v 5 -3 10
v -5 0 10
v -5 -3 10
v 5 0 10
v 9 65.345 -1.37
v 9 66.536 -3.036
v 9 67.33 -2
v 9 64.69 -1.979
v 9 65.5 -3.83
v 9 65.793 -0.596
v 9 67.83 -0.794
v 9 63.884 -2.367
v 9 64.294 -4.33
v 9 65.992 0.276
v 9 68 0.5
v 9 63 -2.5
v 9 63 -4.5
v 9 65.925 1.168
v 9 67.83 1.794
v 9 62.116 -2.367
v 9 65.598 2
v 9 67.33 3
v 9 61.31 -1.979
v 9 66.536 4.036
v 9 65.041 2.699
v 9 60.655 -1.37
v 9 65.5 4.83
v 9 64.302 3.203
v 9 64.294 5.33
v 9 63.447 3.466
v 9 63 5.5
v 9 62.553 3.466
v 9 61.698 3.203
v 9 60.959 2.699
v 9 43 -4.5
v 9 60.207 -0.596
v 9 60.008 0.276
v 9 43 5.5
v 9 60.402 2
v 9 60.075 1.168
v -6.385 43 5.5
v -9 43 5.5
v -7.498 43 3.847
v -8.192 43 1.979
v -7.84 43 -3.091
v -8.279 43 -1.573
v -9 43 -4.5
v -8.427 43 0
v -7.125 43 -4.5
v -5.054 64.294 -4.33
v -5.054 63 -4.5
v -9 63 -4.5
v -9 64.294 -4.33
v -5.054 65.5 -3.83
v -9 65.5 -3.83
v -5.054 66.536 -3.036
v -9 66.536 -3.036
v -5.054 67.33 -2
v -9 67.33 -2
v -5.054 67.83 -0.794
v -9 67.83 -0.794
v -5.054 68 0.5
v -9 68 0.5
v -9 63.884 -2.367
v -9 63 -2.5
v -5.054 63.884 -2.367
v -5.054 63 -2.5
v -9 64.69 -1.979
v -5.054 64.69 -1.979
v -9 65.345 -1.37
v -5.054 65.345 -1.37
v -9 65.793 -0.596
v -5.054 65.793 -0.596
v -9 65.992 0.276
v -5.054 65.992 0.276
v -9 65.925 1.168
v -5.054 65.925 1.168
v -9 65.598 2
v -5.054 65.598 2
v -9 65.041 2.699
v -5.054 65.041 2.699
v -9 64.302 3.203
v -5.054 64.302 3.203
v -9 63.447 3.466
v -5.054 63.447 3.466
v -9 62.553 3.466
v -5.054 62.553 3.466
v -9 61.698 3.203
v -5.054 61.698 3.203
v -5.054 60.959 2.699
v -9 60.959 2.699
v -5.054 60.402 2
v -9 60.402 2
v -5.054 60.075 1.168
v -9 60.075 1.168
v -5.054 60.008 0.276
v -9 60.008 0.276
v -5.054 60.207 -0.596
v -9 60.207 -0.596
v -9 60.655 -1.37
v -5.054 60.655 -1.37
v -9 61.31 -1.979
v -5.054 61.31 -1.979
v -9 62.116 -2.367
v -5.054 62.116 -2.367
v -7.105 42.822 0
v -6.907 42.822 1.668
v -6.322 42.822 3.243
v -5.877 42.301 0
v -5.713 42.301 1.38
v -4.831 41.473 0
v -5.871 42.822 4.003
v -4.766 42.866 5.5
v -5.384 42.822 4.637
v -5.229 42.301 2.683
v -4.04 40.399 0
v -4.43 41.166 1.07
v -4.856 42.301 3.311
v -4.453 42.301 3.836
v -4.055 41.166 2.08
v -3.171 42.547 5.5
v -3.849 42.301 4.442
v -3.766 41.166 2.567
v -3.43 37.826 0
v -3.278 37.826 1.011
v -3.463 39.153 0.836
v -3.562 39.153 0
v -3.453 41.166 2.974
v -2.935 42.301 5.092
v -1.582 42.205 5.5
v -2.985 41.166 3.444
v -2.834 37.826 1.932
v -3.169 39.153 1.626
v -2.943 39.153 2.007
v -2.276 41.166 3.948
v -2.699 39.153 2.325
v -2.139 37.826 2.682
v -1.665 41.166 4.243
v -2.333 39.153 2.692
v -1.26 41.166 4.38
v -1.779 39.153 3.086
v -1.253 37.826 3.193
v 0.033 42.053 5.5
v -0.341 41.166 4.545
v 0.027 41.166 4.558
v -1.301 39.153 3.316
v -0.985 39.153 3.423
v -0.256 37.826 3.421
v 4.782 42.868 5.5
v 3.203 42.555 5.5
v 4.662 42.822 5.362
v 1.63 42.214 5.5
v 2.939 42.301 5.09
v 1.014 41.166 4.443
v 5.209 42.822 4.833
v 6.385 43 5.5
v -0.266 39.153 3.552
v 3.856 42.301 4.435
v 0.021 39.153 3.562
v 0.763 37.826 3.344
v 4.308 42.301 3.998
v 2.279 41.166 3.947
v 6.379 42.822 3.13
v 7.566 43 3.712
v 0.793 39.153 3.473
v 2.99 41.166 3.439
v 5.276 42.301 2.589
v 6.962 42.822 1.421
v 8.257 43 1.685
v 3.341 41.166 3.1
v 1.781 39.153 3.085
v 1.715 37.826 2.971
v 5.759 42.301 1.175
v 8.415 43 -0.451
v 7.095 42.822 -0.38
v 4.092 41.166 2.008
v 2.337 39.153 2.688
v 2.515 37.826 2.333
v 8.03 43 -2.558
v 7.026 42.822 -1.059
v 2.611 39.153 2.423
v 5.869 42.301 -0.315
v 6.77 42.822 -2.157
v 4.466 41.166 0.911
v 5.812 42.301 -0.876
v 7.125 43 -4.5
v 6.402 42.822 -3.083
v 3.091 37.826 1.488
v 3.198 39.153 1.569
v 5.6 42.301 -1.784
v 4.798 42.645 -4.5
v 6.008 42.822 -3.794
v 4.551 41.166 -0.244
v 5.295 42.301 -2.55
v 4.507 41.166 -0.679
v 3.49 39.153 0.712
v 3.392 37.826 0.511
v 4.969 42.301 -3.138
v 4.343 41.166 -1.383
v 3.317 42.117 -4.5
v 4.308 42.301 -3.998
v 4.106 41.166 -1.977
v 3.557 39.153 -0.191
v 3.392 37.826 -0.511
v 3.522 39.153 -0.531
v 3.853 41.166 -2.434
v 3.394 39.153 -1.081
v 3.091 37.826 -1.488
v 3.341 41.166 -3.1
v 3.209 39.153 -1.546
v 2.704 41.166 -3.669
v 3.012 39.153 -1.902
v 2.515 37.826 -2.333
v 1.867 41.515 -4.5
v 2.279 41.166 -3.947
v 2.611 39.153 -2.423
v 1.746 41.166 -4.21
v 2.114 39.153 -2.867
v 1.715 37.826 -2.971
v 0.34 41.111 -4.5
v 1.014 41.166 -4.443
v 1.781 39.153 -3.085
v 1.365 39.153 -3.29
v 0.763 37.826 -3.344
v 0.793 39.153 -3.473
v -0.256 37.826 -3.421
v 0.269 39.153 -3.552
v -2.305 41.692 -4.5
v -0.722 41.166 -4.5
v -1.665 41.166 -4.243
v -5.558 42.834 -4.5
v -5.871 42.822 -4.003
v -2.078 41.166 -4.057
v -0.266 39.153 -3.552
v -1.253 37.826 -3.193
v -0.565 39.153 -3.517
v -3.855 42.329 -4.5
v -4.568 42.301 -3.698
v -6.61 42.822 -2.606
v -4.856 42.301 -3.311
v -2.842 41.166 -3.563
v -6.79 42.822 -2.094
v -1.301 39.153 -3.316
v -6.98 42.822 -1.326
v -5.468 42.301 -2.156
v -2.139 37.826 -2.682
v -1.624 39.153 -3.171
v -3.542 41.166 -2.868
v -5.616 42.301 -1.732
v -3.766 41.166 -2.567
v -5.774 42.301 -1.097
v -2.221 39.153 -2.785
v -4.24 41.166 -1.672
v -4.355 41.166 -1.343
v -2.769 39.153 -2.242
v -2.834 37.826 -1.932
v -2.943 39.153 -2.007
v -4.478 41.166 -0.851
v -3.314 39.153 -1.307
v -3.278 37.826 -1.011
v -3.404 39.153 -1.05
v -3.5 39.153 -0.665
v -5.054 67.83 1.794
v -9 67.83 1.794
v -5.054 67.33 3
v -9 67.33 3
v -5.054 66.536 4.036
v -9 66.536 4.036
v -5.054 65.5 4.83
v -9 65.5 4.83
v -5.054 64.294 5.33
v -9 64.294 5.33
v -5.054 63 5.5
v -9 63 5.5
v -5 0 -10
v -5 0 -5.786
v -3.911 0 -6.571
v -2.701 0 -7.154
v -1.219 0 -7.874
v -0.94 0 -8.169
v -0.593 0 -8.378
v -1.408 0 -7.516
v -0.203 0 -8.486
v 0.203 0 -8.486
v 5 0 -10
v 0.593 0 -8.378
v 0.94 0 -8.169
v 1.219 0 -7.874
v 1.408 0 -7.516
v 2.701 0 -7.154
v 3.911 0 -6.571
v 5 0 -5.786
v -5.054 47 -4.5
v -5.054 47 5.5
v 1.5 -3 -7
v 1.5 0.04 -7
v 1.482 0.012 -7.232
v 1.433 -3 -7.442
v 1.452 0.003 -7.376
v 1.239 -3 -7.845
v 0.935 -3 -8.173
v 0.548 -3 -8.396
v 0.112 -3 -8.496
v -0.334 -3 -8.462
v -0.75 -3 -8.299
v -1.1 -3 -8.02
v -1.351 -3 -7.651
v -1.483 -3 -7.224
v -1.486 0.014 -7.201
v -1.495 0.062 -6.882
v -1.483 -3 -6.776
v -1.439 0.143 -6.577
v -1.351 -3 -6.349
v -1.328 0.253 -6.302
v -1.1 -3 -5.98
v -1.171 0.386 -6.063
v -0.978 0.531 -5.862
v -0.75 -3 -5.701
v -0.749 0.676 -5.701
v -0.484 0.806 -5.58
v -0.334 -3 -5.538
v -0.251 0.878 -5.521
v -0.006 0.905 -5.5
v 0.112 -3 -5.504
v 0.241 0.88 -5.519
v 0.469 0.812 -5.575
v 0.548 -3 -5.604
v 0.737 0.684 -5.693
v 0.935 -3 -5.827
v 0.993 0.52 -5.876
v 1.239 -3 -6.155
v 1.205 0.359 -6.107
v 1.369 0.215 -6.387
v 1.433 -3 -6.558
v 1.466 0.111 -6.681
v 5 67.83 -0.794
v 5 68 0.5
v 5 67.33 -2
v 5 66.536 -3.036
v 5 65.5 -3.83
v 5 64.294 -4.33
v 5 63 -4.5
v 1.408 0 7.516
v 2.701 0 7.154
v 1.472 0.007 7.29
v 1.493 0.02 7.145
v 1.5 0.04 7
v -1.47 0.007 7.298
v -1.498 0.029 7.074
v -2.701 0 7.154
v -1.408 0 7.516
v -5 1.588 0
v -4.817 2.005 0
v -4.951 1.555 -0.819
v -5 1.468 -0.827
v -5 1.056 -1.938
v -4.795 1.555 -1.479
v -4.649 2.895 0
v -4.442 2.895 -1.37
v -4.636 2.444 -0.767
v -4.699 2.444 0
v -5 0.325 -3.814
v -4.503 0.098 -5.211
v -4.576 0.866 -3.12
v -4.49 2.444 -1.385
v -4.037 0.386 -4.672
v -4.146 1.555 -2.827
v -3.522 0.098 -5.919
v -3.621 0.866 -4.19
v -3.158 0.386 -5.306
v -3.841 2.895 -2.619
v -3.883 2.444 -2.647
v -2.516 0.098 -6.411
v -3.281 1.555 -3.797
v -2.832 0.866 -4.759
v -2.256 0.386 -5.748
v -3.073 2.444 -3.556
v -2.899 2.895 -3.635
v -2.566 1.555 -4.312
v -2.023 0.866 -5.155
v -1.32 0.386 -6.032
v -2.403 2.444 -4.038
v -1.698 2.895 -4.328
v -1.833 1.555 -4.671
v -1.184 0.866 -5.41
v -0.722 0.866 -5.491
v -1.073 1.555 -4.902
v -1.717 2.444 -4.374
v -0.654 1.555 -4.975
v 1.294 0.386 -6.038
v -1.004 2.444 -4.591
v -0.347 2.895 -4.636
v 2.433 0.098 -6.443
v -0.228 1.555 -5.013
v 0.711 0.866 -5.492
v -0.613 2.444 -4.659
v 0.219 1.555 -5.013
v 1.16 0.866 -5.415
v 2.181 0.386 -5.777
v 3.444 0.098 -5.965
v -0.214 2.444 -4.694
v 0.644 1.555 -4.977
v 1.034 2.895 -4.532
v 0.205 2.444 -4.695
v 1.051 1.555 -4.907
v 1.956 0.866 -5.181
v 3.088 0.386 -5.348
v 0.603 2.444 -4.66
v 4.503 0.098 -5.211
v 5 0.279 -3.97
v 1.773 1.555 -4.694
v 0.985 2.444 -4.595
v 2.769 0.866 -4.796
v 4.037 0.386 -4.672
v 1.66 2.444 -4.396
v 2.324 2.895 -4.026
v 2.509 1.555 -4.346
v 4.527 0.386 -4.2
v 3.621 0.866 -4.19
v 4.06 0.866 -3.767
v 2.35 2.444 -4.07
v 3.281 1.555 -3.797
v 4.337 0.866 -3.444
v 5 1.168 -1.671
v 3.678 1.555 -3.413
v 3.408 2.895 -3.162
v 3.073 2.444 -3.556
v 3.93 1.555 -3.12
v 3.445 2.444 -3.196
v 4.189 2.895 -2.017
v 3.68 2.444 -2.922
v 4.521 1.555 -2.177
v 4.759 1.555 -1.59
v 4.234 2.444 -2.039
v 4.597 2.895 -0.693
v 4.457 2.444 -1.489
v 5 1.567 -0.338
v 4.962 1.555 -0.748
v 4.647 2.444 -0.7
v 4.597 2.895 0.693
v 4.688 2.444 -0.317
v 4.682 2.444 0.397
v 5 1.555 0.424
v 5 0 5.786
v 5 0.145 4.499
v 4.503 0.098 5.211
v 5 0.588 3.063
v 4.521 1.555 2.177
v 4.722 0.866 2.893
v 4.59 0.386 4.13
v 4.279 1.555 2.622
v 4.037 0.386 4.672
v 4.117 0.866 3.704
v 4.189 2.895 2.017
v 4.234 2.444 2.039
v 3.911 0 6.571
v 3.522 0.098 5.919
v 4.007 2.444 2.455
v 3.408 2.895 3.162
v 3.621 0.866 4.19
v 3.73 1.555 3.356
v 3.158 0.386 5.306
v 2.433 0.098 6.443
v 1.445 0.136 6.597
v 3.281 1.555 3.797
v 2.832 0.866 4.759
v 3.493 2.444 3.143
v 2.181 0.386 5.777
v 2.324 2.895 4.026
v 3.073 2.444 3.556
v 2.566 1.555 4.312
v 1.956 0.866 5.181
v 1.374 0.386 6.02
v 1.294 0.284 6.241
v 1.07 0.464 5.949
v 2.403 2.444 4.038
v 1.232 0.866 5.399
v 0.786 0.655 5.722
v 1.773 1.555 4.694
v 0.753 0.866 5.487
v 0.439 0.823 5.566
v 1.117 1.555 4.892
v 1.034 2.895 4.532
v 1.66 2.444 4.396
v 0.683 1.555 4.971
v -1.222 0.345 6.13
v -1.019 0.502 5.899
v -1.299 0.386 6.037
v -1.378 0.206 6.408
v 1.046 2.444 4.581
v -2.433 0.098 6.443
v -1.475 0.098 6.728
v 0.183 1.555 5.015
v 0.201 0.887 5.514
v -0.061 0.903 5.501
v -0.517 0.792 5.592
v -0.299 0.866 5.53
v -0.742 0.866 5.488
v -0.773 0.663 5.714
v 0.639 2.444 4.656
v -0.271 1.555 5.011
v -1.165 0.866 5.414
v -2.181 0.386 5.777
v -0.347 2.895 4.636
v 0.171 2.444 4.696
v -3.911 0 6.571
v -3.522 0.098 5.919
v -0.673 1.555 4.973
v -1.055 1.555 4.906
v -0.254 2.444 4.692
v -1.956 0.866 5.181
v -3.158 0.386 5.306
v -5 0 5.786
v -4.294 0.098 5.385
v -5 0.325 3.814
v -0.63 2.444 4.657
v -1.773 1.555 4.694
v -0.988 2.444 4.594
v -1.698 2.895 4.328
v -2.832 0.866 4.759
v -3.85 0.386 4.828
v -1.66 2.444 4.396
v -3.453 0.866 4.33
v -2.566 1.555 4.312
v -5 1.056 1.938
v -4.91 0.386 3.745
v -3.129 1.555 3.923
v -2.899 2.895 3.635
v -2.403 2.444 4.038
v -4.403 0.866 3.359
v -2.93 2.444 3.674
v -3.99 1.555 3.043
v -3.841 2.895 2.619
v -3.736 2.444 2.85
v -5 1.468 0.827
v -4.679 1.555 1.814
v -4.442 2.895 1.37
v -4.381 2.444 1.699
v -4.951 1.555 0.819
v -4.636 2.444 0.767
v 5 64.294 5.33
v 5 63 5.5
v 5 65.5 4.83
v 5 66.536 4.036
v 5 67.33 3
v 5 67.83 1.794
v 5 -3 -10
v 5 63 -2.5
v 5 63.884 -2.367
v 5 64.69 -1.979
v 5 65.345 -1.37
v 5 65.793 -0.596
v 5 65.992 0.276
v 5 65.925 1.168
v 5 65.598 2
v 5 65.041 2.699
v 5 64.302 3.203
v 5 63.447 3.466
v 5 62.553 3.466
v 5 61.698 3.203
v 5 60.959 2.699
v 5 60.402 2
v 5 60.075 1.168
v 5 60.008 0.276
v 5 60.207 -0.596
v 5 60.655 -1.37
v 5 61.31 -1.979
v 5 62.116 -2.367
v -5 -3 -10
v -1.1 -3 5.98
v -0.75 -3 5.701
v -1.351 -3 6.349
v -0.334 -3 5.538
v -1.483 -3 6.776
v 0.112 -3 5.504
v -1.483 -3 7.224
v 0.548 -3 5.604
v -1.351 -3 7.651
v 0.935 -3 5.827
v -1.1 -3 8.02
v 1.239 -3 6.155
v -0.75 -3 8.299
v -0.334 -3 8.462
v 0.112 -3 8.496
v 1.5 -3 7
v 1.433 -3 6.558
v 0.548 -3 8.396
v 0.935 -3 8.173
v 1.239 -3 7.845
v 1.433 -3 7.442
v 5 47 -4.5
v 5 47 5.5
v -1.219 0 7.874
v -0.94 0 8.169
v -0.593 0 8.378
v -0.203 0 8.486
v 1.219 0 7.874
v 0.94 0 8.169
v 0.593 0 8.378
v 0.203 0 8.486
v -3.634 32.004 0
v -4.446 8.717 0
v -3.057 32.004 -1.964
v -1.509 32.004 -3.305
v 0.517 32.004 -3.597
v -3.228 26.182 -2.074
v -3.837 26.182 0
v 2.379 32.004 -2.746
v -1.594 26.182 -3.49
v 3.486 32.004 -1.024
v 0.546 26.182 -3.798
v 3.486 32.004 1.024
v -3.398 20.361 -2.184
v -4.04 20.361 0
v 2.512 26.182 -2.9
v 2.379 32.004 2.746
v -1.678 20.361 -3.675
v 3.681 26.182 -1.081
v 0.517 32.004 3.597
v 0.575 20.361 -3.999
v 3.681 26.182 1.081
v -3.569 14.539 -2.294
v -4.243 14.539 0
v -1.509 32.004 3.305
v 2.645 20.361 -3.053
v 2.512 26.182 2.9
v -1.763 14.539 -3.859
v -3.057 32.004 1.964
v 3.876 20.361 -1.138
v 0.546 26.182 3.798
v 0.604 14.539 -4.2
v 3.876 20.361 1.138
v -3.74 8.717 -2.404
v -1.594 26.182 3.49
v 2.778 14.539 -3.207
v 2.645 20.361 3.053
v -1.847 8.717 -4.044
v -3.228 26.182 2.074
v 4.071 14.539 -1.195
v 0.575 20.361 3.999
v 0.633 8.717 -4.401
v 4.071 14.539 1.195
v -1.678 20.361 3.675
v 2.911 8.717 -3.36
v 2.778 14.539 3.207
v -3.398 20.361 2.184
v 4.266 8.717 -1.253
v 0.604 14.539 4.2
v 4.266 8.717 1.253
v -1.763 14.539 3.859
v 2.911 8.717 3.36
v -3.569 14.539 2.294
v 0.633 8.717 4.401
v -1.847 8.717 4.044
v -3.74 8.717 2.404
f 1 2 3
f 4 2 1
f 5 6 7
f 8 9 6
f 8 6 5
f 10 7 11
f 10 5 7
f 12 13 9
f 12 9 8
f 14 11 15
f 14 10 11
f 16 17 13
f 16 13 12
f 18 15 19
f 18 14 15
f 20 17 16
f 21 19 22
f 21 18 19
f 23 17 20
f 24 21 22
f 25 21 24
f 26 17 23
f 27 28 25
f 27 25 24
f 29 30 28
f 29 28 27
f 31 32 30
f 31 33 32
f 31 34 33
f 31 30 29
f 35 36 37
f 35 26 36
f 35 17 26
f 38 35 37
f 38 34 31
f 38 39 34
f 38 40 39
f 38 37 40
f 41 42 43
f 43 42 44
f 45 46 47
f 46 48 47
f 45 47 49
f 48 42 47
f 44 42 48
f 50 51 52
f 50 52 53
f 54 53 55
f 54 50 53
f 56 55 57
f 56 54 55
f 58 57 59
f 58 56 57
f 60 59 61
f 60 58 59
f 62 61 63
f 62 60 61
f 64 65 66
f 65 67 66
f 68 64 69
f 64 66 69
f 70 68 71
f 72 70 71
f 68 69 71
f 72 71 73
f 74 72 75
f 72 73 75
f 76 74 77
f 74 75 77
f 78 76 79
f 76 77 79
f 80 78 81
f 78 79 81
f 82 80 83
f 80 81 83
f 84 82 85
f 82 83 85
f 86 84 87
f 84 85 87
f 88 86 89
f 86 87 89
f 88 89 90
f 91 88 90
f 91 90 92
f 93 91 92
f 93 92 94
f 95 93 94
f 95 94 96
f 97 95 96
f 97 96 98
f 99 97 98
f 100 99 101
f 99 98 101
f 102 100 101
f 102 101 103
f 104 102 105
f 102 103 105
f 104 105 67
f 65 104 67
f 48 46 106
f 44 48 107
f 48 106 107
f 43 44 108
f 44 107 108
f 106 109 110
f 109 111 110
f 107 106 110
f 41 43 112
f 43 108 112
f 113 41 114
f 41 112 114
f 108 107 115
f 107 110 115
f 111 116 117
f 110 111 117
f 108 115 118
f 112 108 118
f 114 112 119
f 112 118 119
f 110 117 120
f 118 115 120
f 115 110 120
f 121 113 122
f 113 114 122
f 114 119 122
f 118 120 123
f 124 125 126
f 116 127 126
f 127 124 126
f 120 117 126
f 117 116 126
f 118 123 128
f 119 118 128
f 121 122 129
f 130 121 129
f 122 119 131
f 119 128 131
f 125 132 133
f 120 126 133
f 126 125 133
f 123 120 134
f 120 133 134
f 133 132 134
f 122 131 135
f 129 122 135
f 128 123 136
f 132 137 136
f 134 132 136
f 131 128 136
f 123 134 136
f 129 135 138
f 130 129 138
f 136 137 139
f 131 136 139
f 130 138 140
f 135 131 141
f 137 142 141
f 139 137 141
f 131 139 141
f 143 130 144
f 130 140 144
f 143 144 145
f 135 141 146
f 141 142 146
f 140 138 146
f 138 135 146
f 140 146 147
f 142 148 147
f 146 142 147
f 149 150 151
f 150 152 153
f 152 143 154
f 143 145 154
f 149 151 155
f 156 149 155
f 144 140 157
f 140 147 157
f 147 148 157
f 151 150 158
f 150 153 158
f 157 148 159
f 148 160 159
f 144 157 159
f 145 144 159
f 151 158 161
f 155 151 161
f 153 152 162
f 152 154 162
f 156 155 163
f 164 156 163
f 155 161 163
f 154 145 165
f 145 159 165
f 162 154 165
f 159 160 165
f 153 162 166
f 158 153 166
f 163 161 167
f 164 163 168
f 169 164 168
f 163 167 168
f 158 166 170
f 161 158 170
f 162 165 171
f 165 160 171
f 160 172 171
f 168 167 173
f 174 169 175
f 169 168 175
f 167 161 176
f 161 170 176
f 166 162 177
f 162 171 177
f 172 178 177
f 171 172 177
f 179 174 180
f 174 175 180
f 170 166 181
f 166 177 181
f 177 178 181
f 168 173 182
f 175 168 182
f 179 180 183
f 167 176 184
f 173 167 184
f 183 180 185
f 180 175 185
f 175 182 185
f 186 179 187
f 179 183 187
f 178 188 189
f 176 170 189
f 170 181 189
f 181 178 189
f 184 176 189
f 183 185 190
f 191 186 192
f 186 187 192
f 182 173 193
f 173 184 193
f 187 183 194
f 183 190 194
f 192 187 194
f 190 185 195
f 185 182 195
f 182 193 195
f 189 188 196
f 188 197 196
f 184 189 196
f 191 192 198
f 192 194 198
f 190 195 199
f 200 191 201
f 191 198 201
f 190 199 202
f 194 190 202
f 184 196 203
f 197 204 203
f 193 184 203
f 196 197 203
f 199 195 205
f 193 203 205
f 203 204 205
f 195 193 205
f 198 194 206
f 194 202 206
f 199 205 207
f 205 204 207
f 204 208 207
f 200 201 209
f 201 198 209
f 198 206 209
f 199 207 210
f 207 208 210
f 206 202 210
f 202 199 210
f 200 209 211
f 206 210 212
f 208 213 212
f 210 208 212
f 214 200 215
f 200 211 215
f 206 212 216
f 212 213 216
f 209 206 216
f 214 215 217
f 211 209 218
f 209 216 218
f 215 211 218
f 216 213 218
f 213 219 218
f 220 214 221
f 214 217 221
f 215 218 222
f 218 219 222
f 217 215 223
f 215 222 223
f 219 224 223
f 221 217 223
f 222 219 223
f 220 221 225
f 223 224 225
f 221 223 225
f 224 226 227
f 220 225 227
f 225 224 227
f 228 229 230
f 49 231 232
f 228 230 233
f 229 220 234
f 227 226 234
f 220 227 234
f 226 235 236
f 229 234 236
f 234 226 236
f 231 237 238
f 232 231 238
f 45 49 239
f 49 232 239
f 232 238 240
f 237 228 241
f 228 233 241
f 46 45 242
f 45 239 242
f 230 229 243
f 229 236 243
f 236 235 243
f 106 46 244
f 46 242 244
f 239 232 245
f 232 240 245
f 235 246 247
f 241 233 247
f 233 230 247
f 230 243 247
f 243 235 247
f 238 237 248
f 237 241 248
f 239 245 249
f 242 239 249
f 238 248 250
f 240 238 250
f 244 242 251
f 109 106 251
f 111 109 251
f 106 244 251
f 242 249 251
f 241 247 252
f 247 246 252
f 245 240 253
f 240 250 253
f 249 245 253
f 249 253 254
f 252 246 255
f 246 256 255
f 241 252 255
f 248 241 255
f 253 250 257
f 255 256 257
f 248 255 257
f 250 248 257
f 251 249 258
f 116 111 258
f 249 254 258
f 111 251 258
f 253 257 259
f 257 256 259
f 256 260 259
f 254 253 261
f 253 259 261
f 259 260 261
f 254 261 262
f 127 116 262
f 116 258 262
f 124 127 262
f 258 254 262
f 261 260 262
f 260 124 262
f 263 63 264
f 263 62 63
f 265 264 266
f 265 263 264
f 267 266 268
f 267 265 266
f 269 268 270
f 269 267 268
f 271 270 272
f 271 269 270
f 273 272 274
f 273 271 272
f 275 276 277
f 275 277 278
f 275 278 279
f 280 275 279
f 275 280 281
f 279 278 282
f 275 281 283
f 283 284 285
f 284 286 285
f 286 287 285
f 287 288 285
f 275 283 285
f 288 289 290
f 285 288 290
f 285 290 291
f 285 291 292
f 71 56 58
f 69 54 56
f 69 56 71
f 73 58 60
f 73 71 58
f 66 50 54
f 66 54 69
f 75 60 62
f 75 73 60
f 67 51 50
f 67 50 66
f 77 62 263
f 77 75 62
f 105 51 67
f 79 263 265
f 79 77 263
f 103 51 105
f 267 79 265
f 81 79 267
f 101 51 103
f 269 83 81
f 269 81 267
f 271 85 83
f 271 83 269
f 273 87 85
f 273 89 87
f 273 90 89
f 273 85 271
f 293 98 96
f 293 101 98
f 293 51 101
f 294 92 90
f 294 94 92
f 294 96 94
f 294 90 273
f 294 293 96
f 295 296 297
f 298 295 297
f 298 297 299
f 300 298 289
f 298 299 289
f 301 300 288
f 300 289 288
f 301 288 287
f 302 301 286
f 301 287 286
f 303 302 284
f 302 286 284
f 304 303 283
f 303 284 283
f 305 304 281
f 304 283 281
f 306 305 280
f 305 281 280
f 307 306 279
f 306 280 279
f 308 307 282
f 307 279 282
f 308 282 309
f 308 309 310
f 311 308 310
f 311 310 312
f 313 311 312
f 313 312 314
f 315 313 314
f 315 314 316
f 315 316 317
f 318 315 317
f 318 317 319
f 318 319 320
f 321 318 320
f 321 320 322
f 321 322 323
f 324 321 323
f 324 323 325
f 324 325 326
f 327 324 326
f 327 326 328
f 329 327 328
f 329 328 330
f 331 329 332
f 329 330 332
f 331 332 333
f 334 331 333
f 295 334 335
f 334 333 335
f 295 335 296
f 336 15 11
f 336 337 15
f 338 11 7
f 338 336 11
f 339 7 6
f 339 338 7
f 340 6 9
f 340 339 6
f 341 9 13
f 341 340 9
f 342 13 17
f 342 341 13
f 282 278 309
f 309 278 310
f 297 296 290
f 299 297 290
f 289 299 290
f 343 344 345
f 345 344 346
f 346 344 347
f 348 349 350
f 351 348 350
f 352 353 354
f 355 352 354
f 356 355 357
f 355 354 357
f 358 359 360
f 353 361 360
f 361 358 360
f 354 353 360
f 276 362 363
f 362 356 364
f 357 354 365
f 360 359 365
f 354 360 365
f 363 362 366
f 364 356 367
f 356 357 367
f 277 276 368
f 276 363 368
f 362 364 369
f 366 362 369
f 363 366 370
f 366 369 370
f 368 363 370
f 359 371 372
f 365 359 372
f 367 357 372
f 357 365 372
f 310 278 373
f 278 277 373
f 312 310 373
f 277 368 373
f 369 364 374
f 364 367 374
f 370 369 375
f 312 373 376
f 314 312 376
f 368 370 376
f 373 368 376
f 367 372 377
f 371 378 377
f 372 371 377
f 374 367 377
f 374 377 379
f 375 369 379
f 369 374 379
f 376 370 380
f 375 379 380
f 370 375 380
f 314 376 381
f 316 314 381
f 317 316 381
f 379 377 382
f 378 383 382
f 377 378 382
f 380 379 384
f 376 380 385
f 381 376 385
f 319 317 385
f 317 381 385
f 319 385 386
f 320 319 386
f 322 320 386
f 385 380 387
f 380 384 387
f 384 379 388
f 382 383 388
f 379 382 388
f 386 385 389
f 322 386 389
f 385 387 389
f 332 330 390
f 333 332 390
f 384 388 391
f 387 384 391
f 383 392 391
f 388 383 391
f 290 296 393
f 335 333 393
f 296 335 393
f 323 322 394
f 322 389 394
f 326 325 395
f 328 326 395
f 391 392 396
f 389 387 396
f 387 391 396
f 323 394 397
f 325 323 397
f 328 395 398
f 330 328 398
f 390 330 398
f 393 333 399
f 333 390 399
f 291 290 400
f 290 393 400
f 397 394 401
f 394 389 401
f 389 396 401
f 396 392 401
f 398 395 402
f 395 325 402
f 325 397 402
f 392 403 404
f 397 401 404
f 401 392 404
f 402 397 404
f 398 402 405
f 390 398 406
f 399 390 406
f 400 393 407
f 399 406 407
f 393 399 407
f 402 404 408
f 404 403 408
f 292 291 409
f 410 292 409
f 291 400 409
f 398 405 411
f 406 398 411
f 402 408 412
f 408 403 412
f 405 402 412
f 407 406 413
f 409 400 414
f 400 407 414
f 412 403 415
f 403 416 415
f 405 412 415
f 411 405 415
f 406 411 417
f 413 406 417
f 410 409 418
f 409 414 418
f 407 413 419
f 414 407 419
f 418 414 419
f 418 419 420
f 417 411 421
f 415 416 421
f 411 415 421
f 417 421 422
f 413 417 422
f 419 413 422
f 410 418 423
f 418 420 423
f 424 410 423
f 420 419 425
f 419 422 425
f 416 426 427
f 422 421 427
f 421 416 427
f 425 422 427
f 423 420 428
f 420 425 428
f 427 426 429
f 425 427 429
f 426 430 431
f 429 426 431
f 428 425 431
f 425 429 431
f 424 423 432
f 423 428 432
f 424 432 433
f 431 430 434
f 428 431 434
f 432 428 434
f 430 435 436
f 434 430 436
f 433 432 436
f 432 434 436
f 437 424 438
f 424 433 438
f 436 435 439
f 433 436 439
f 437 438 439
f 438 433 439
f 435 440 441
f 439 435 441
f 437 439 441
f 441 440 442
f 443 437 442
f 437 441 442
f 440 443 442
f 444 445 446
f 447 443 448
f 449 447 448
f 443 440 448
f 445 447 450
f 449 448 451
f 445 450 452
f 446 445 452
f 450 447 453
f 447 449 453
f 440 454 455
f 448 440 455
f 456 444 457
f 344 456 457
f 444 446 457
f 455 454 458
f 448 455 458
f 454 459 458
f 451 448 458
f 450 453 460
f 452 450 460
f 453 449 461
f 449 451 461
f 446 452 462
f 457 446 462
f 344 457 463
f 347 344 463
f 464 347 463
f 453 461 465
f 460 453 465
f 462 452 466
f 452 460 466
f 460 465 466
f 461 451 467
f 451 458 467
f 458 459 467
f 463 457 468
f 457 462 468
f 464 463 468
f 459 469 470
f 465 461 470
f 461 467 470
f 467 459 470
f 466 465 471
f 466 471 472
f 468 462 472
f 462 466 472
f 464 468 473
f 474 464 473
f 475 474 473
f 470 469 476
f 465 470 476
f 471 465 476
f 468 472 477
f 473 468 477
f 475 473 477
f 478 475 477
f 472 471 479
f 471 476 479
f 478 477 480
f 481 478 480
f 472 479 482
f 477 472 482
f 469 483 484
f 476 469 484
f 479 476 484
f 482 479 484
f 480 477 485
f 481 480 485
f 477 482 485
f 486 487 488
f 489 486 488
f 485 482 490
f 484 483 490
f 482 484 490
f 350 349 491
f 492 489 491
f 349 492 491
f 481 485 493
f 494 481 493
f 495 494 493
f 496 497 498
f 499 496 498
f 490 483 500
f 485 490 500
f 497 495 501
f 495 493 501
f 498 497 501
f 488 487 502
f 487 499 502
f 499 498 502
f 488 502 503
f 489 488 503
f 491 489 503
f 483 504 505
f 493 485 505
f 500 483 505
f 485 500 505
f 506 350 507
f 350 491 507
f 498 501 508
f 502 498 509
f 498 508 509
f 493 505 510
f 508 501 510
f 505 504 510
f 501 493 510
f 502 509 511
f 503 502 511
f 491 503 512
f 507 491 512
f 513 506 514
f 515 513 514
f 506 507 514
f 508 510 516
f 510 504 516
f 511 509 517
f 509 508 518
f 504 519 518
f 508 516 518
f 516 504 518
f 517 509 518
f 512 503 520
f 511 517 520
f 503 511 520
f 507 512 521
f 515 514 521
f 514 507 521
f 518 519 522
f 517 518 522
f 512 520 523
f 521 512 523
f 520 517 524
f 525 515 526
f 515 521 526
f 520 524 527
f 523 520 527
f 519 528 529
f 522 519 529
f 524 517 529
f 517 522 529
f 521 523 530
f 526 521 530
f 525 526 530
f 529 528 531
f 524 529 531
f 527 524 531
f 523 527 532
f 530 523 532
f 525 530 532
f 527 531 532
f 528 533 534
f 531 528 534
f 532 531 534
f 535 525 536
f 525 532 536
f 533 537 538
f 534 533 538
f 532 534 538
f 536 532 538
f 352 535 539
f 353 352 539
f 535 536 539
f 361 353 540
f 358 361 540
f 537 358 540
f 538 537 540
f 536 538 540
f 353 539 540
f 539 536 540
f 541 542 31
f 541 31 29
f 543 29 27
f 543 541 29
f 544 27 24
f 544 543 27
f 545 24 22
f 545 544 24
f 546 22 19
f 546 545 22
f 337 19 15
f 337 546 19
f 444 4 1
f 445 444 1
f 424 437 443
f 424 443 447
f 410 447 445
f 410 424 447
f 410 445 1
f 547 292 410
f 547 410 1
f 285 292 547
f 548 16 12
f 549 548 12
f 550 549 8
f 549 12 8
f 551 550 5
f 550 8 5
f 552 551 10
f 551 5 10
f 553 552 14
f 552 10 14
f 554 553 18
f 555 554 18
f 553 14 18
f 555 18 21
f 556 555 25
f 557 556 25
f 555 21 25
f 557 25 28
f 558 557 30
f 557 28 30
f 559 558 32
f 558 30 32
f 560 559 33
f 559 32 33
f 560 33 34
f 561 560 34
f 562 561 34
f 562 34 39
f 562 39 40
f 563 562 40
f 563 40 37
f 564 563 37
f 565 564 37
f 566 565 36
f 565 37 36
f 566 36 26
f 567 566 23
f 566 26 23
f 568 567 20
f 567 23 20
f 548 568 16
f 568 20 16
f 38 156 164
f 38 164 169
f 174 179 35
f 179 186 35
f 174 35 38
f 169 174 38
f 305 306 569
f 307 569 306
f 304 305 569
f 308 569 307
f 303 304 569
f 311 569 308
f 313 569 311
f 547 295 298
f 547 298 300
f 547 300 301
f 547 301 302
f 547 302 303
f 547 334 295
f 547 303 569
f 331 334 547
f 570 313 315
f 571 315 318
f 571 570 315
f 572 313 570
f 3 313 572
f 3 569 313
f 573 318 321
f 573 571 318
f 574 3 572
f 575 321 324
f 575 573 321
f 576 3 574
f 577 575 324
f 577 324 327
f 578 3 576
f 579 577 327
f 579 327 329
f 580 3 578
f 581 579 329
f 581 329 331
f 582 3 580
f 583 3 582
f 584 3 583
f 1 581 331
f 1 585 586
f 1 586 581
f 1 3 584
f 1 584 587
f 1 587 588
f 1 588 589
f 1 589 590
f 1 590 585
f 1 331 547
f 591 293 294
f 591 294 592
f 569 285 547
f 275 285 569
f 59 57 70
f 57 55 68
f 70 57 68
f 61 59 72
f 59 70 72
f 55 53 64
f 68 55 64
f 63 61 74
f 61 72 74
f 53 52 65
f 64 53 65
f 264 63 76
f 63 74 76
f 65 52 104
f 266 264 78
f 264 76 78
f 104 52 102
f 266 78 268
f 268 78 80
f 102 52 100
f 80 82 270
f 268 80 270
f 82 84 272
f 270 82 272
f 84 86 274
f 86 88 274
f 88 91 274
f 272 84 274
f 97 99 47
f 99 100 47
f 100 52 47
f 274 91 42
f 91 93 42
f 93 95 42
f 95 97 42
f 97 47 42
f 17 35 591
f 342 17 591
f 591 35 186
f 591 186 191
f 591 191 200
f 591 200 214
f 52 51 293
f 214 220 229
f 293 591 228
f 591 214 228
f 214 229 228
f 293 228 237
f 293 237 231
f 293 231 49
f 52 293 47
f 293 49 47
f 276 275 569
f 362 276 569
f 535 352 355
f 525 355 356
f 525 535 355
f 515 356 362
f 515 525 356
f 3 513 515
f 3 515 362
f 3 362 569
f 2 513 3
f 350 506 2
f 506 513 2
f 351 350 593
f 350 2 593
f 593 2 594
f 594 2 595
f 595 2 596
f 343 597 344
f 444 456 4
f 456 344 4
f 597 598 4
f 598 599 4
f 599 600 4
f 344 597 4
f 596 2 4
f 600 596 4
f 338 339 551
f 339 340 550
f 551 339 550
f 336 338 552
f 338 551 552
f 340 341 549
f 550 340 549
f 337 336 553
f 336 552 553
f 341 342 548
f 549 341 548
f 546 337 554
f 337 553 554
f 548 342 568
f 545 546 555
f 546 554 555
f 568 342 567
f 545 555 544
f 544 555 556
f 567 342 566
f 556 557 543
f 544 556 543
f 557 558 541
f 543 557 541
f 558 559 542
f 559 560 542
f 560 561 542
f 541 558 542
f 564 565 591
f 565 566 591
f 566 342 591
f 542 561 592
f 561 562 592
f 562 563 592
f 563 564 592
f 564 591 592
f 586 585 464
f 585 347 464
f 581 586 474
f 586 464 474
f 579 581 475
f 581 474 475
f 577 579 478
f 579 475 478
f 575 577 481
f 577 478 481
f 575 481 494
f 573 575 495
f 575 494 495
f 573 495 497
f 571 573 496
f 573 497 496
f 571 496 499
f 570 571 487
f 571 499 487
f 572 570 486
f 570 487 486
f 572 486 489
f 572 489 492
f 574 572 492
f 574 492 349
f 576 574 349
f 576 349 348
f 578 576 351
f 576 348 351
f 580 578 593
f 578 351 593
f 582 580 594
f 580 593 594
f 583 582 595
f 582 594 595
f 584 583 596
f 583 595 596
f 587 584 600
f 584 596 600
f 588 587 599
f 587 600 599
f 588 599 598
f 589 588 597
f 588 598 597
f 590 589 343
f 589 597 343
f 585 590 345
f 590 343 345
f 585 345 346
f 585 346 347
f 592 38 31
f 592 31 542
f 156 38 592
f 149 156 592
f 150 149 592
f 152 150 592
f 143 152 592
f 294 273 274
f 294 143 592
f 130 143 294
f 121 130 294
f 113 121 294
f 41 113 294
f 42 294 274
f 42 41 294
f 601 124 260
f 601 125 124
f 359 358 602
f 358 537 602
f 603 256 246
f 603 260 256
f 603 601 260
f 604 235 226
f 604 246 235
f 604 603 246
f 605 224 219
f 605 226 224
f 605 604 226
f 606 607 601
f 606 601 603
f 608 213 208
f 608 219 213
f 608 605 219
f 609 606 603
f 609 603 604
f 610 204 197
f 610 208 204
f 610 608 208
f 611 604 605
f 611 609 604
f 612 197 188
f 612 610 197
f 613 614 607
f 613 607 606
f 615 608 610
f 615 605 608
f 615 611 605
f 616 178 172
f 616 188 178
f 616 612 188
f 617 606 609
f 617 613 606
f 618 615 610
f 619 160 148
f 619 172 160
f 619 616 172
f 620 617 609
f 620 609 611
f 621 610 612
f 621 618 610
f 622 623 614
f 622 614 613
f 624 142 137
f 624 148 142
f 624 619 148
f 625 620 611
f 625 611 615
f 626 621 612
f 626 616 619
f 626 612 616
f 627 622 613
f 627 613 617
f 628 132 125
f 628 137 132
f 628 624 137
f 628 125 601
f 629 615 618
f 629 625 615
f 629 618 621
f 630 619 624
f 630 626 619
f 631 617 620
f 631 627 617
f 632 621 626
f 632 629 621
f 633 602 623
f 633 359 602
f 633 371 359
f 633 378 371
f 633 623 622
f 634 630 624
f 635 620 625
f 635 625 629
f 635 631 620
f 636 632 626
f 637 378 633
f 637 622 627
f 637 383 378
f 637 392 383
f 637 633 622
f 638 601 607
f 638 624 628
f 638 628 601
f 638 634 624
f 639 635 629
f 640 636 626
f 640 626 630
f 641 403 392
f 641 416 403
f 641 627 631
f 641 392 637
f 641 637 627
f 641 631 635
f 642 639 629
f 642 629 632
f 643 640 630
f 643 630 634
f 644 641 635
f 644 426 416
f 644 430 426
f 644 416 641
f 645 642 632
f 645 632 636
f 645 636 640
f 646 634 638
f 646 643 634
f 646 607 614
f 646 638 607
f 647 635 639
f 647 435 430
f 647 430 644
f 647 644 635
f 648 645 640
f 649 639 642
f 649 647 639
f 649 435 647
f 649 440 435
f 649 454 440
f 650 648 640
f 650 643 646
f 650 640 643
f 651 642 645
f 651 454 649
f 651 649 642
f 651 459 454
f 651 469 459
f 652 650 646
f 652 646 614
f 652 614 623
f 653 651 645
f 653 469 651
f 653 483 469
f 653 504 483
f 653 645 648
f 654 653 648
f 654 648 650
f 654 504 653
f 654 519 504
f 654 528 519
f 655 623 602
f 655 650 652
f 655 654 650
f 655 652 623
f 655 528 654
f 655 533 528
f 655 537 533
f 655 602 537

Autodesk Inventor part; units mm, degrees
sketch "Sketch1" plane through (0, 0, 0) normal (0, 1, 0) x (-1, 0, 0)
  circle A0 centre (0, 0) radius 4.75
  dimension "d0" = 9.5
  dimension "d31" = 0
ref_plane "Work Plane1" through (0, 43, 0) normal (0, 1, 0) x (-1, 0, 0)
sketch "Sketch2" plane through (0, 43, 0) normal (0, 1, 0) x (-1, 0, 0)
  circle A0 centre (0, 0) radius 3.25
  dimension "d2" = 6.5
  dimension "d32" = 0
loft "Loft1" add profiles "Sketch1", "Sketch2"
sketch "Sketch3" plane through (0, 0, 0) normal (0, -1, 0) x (1, 0, 0)
  circle A0 centre (0, 0) radius 4.75
  line L0 (0, 0) -> (5, 0)
  line L1 (5, 0) -> (5, -10)
  line L2 (5, -10) -> (-5, -10)
  line L3 (-5, -10) -> (-5, 10)
  line L4 (-5, 10) -> (5, 10)
  line L5 (5, 10) -> (5, 0)
  dimension "d7" = 5
  dimension "d8" = 10
  dimension "d9" = 10
  dimension "d10" = 20
  dimension "d11" = 10
  dimension "d33" = 9.5
  dimension "d34" = 5
  dimension "d35" = 0
  dimension "d36" = 5
  dimension "d37" = 0
extrude "Extrusion1" add sketch "Sketch3" along normal blind 3
sketch "Sketch4" plane through (0, 0, 0) normal (0, -1, 0) x (1, 0, 0)
  circle A0 centre (0, 0) radius 5
  dimension "d14" = 10
  dimension "d38" = 0
extrude "Extrusion2" add sketch "Sketch4" along normal blind 3
sketch "Sketch5" plane through (0, 0, 0) normal (0, 1, 0) x (1, 0, 0)
  line L0 (-5, -10) -> (5, -10)
  line L1 (0, -10) -> (0, -7)
  line L2 (0, -7) -> (0, 7)
  circle A0 centre (0, -7) radius 1.5
  circle A1 centre (0, 7) radius 1.5
  point P0 (0, 0)
  point P1 (0, 0)
  dimension "d17" = 3
  dimension "d18" = 14
  dimension "d19" = 3
  dimension "d20" = 3
  dimension "d39" = 0
  dimension "d40" = 10
  dimension "d41" = 5
  dimension "d42" = 0
  dimension "d43" = 10
extrude "Extrusion3" cut sketch "Sketch5" against normal through all
fillet "Fillet1" radius 3 1 edges at (4.75, 0, 0)
sketch "Sketch7" plane through (0, 43, 0) normal (0, 1, 0) x (1, 0, 0)
  line L0 (0, 0) -> (5, 0) construction
  line L1 (5, 0) -> (-5, 0) construction
  line L2 (-5, 0) -> (-5, -9) construction
  line L3 (9, 4.5) -> (-9, 4.5)
  line L4 (-9, 4.5) -> (-9, -5.5)
  line L5 (9, 4.5) -> (9, -5.5)
  line L6 (9, -5.5) -> (-9, -5.5)
  point P0 (-5, 9)
  dimension "d79" = 10
  dimension "d80" = 4.5
  dimension "d81" = 10
  dimension "d82" = 14
  dimension "d83" = 18
  dimension "d84" = 9
  dimension "d85" = 4
  dimension "d86" = 9
  dimension "d87" = 9
extrude "Extrusion5" add sketch "Sketch7" along normal blind 4
fillet "Fillet4" radius 5 1 edges at (3.25, 43, 0)
sketch "Sketch10" plane through (0, 47, 0) normal (0, 1, 0) x (1, 0, 0)
  line L0 (9, -5.5) -> (9, 4.5)
  line L1 (9, -5.5) -> (6.9294, -5.5)
  line L2 (-9, 4.5) -> (-9, 4.5)
  line L3 (-9, 4.5) -> (-9, -5.5)
  line L4 (-9, -5.5) -> (-9, -5.5)
  line L5 (-5.054, 4.5) -> (-5.054, -5.5)
  line L6 (5, 10) -> (5, -10) projected
  line L7 (5, 4.5) -> (5, -5.5)
  line L8 (-9, 4.5) -> (-5.054, 4.5)
  line L9 (-9, -5.5) -> (-5.054, -5.5)
  line L10 (5, -5.5) -> (9, -5.5)
  line L11 (9, -5.5) -> (9, 4.5) projected
  line L12 (9, 4.5) -> (9, -5.5)
  line L13 (-9, -5.5) -> (9, -5.5) projected
  line L14 (5, -5.5) -> (9, -5.5)
  line L15 (9, -5.5) -> (9, 4.5)
  line L16 (5, 4.5) -> (5, -5.5)
  line L17 (9, -5.5) -> (5, -5.5)
  line L18 (9, 4.5) -> (5, 4.5)
  point P0 (0, 0)
  dimension "d102" = 10.054
  dimension "d103" = 90
  dimension "d105" = 90
  dimension "d106" = 2.0706
  dimension "d108" = 18
  dimension "d109" = 18
ref_plane "Work Plane3" through (5.1564, 47, -4.5) normal (-0.9999978, 0, 0.0020944) x (0.0020944, 0, 0.9999978)
ref_plane "Work Plane2" through (0.59, 0, 0) normal (1, 0, 0) x (0, 1, 0)
extrude "Extrusion10" add sketch "Sketch10" along normal blind 21
fillet "Fillet6" radius 5 4 edges at (-7.027, 68, 5.5) (-7.027, 68, -4.5) (7, 68, 5.5) (7, 68, -4.5)
sketch "Sketch12" plane through (9, 43, 5.5) normal (1, 0, 0) x (0, 0, -1)
  arc A0 (10, 20) -> (0, 20) centre (5, 20) ccw projected
  circle A1 centre (5, 20) radius 3
  point P0 (5.5, -43)
  dimension "d113" = 6
extrude "Extrusion11" cut sketch "Sketch12" against normal blind 21
properties part number "reverse gear crank rod 1"
